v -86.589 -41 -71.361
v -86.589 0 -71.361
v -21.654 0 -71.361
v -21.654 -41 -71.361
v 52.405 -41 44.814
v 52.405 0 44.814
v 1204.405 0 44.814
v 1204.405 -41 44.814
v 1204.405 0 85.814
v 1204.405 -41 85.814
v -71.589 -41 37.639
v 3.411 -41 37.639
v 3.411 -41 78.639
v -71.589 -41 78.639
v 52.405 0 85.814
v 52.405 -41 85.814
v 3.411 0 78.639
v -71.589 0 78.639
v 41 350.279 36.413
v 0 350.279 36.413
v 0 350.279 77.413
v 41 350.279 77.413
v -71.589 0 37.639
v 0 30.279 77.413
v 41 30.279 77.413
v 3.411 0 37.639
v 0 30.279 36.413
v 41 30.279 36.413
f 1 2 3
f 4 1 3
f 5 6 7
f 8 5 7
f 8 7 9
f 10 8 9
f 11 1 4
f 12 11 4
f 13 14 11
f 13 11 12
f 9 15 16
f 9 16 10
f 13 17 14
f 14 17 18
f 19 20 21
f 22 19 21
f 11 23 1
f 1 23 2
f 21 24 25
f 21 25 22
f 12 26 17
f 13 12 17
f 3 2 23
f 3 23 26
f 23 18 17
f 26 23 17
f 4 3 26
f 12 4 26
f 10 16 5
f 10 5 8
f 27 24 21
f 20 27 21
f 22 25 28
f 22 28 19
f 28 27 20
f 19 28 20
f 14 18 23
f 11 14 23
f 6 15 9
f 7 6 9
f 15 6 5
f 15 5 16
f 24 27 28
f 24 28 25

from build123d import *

# Parameters (mm, degrees)
F1_DEPTH = 41
F2_W     = 1152
F2_H     = 41
F3_DEPTH = 41
F4_W     = 320
F4_H     = 41
F5_DEPTH = 41


with BuildPart() as f1:
    # F0 (on Front) → F1 (new body)
    with BuildSketch(Plane.XZ):
        Polygon((3.41058, 78.639174), (-71.58942, 78.639174), (-71.58942, 37.639174), (-86.58942, -71.360826), (-21.654289, -71.360826), (3.41058, 37.639174), align=None)
    extrude(amount=F1_DEPTH)


with BuildPart() as f3:
    # F2 (on Front) → F3 (new body)
    with BuildSketch(Plane.XZ):
        with Locations((628.404556, 65.313812)):
            Rectangle(F2_W, F2_H)
    extrude(amount=F3_DEPTH)


with BuildPart() as f5:
    # F4 (on Right) → F5 (new body)
    with BuildSketch(Plane.YZ):
        with Locations((190.279366, 56.91339)):
            Rectangle(F4_W, F4_H)
    extrude(amount=F5_DEPTH)


solid = Compound([f1.part, f3.part, f5.part])
